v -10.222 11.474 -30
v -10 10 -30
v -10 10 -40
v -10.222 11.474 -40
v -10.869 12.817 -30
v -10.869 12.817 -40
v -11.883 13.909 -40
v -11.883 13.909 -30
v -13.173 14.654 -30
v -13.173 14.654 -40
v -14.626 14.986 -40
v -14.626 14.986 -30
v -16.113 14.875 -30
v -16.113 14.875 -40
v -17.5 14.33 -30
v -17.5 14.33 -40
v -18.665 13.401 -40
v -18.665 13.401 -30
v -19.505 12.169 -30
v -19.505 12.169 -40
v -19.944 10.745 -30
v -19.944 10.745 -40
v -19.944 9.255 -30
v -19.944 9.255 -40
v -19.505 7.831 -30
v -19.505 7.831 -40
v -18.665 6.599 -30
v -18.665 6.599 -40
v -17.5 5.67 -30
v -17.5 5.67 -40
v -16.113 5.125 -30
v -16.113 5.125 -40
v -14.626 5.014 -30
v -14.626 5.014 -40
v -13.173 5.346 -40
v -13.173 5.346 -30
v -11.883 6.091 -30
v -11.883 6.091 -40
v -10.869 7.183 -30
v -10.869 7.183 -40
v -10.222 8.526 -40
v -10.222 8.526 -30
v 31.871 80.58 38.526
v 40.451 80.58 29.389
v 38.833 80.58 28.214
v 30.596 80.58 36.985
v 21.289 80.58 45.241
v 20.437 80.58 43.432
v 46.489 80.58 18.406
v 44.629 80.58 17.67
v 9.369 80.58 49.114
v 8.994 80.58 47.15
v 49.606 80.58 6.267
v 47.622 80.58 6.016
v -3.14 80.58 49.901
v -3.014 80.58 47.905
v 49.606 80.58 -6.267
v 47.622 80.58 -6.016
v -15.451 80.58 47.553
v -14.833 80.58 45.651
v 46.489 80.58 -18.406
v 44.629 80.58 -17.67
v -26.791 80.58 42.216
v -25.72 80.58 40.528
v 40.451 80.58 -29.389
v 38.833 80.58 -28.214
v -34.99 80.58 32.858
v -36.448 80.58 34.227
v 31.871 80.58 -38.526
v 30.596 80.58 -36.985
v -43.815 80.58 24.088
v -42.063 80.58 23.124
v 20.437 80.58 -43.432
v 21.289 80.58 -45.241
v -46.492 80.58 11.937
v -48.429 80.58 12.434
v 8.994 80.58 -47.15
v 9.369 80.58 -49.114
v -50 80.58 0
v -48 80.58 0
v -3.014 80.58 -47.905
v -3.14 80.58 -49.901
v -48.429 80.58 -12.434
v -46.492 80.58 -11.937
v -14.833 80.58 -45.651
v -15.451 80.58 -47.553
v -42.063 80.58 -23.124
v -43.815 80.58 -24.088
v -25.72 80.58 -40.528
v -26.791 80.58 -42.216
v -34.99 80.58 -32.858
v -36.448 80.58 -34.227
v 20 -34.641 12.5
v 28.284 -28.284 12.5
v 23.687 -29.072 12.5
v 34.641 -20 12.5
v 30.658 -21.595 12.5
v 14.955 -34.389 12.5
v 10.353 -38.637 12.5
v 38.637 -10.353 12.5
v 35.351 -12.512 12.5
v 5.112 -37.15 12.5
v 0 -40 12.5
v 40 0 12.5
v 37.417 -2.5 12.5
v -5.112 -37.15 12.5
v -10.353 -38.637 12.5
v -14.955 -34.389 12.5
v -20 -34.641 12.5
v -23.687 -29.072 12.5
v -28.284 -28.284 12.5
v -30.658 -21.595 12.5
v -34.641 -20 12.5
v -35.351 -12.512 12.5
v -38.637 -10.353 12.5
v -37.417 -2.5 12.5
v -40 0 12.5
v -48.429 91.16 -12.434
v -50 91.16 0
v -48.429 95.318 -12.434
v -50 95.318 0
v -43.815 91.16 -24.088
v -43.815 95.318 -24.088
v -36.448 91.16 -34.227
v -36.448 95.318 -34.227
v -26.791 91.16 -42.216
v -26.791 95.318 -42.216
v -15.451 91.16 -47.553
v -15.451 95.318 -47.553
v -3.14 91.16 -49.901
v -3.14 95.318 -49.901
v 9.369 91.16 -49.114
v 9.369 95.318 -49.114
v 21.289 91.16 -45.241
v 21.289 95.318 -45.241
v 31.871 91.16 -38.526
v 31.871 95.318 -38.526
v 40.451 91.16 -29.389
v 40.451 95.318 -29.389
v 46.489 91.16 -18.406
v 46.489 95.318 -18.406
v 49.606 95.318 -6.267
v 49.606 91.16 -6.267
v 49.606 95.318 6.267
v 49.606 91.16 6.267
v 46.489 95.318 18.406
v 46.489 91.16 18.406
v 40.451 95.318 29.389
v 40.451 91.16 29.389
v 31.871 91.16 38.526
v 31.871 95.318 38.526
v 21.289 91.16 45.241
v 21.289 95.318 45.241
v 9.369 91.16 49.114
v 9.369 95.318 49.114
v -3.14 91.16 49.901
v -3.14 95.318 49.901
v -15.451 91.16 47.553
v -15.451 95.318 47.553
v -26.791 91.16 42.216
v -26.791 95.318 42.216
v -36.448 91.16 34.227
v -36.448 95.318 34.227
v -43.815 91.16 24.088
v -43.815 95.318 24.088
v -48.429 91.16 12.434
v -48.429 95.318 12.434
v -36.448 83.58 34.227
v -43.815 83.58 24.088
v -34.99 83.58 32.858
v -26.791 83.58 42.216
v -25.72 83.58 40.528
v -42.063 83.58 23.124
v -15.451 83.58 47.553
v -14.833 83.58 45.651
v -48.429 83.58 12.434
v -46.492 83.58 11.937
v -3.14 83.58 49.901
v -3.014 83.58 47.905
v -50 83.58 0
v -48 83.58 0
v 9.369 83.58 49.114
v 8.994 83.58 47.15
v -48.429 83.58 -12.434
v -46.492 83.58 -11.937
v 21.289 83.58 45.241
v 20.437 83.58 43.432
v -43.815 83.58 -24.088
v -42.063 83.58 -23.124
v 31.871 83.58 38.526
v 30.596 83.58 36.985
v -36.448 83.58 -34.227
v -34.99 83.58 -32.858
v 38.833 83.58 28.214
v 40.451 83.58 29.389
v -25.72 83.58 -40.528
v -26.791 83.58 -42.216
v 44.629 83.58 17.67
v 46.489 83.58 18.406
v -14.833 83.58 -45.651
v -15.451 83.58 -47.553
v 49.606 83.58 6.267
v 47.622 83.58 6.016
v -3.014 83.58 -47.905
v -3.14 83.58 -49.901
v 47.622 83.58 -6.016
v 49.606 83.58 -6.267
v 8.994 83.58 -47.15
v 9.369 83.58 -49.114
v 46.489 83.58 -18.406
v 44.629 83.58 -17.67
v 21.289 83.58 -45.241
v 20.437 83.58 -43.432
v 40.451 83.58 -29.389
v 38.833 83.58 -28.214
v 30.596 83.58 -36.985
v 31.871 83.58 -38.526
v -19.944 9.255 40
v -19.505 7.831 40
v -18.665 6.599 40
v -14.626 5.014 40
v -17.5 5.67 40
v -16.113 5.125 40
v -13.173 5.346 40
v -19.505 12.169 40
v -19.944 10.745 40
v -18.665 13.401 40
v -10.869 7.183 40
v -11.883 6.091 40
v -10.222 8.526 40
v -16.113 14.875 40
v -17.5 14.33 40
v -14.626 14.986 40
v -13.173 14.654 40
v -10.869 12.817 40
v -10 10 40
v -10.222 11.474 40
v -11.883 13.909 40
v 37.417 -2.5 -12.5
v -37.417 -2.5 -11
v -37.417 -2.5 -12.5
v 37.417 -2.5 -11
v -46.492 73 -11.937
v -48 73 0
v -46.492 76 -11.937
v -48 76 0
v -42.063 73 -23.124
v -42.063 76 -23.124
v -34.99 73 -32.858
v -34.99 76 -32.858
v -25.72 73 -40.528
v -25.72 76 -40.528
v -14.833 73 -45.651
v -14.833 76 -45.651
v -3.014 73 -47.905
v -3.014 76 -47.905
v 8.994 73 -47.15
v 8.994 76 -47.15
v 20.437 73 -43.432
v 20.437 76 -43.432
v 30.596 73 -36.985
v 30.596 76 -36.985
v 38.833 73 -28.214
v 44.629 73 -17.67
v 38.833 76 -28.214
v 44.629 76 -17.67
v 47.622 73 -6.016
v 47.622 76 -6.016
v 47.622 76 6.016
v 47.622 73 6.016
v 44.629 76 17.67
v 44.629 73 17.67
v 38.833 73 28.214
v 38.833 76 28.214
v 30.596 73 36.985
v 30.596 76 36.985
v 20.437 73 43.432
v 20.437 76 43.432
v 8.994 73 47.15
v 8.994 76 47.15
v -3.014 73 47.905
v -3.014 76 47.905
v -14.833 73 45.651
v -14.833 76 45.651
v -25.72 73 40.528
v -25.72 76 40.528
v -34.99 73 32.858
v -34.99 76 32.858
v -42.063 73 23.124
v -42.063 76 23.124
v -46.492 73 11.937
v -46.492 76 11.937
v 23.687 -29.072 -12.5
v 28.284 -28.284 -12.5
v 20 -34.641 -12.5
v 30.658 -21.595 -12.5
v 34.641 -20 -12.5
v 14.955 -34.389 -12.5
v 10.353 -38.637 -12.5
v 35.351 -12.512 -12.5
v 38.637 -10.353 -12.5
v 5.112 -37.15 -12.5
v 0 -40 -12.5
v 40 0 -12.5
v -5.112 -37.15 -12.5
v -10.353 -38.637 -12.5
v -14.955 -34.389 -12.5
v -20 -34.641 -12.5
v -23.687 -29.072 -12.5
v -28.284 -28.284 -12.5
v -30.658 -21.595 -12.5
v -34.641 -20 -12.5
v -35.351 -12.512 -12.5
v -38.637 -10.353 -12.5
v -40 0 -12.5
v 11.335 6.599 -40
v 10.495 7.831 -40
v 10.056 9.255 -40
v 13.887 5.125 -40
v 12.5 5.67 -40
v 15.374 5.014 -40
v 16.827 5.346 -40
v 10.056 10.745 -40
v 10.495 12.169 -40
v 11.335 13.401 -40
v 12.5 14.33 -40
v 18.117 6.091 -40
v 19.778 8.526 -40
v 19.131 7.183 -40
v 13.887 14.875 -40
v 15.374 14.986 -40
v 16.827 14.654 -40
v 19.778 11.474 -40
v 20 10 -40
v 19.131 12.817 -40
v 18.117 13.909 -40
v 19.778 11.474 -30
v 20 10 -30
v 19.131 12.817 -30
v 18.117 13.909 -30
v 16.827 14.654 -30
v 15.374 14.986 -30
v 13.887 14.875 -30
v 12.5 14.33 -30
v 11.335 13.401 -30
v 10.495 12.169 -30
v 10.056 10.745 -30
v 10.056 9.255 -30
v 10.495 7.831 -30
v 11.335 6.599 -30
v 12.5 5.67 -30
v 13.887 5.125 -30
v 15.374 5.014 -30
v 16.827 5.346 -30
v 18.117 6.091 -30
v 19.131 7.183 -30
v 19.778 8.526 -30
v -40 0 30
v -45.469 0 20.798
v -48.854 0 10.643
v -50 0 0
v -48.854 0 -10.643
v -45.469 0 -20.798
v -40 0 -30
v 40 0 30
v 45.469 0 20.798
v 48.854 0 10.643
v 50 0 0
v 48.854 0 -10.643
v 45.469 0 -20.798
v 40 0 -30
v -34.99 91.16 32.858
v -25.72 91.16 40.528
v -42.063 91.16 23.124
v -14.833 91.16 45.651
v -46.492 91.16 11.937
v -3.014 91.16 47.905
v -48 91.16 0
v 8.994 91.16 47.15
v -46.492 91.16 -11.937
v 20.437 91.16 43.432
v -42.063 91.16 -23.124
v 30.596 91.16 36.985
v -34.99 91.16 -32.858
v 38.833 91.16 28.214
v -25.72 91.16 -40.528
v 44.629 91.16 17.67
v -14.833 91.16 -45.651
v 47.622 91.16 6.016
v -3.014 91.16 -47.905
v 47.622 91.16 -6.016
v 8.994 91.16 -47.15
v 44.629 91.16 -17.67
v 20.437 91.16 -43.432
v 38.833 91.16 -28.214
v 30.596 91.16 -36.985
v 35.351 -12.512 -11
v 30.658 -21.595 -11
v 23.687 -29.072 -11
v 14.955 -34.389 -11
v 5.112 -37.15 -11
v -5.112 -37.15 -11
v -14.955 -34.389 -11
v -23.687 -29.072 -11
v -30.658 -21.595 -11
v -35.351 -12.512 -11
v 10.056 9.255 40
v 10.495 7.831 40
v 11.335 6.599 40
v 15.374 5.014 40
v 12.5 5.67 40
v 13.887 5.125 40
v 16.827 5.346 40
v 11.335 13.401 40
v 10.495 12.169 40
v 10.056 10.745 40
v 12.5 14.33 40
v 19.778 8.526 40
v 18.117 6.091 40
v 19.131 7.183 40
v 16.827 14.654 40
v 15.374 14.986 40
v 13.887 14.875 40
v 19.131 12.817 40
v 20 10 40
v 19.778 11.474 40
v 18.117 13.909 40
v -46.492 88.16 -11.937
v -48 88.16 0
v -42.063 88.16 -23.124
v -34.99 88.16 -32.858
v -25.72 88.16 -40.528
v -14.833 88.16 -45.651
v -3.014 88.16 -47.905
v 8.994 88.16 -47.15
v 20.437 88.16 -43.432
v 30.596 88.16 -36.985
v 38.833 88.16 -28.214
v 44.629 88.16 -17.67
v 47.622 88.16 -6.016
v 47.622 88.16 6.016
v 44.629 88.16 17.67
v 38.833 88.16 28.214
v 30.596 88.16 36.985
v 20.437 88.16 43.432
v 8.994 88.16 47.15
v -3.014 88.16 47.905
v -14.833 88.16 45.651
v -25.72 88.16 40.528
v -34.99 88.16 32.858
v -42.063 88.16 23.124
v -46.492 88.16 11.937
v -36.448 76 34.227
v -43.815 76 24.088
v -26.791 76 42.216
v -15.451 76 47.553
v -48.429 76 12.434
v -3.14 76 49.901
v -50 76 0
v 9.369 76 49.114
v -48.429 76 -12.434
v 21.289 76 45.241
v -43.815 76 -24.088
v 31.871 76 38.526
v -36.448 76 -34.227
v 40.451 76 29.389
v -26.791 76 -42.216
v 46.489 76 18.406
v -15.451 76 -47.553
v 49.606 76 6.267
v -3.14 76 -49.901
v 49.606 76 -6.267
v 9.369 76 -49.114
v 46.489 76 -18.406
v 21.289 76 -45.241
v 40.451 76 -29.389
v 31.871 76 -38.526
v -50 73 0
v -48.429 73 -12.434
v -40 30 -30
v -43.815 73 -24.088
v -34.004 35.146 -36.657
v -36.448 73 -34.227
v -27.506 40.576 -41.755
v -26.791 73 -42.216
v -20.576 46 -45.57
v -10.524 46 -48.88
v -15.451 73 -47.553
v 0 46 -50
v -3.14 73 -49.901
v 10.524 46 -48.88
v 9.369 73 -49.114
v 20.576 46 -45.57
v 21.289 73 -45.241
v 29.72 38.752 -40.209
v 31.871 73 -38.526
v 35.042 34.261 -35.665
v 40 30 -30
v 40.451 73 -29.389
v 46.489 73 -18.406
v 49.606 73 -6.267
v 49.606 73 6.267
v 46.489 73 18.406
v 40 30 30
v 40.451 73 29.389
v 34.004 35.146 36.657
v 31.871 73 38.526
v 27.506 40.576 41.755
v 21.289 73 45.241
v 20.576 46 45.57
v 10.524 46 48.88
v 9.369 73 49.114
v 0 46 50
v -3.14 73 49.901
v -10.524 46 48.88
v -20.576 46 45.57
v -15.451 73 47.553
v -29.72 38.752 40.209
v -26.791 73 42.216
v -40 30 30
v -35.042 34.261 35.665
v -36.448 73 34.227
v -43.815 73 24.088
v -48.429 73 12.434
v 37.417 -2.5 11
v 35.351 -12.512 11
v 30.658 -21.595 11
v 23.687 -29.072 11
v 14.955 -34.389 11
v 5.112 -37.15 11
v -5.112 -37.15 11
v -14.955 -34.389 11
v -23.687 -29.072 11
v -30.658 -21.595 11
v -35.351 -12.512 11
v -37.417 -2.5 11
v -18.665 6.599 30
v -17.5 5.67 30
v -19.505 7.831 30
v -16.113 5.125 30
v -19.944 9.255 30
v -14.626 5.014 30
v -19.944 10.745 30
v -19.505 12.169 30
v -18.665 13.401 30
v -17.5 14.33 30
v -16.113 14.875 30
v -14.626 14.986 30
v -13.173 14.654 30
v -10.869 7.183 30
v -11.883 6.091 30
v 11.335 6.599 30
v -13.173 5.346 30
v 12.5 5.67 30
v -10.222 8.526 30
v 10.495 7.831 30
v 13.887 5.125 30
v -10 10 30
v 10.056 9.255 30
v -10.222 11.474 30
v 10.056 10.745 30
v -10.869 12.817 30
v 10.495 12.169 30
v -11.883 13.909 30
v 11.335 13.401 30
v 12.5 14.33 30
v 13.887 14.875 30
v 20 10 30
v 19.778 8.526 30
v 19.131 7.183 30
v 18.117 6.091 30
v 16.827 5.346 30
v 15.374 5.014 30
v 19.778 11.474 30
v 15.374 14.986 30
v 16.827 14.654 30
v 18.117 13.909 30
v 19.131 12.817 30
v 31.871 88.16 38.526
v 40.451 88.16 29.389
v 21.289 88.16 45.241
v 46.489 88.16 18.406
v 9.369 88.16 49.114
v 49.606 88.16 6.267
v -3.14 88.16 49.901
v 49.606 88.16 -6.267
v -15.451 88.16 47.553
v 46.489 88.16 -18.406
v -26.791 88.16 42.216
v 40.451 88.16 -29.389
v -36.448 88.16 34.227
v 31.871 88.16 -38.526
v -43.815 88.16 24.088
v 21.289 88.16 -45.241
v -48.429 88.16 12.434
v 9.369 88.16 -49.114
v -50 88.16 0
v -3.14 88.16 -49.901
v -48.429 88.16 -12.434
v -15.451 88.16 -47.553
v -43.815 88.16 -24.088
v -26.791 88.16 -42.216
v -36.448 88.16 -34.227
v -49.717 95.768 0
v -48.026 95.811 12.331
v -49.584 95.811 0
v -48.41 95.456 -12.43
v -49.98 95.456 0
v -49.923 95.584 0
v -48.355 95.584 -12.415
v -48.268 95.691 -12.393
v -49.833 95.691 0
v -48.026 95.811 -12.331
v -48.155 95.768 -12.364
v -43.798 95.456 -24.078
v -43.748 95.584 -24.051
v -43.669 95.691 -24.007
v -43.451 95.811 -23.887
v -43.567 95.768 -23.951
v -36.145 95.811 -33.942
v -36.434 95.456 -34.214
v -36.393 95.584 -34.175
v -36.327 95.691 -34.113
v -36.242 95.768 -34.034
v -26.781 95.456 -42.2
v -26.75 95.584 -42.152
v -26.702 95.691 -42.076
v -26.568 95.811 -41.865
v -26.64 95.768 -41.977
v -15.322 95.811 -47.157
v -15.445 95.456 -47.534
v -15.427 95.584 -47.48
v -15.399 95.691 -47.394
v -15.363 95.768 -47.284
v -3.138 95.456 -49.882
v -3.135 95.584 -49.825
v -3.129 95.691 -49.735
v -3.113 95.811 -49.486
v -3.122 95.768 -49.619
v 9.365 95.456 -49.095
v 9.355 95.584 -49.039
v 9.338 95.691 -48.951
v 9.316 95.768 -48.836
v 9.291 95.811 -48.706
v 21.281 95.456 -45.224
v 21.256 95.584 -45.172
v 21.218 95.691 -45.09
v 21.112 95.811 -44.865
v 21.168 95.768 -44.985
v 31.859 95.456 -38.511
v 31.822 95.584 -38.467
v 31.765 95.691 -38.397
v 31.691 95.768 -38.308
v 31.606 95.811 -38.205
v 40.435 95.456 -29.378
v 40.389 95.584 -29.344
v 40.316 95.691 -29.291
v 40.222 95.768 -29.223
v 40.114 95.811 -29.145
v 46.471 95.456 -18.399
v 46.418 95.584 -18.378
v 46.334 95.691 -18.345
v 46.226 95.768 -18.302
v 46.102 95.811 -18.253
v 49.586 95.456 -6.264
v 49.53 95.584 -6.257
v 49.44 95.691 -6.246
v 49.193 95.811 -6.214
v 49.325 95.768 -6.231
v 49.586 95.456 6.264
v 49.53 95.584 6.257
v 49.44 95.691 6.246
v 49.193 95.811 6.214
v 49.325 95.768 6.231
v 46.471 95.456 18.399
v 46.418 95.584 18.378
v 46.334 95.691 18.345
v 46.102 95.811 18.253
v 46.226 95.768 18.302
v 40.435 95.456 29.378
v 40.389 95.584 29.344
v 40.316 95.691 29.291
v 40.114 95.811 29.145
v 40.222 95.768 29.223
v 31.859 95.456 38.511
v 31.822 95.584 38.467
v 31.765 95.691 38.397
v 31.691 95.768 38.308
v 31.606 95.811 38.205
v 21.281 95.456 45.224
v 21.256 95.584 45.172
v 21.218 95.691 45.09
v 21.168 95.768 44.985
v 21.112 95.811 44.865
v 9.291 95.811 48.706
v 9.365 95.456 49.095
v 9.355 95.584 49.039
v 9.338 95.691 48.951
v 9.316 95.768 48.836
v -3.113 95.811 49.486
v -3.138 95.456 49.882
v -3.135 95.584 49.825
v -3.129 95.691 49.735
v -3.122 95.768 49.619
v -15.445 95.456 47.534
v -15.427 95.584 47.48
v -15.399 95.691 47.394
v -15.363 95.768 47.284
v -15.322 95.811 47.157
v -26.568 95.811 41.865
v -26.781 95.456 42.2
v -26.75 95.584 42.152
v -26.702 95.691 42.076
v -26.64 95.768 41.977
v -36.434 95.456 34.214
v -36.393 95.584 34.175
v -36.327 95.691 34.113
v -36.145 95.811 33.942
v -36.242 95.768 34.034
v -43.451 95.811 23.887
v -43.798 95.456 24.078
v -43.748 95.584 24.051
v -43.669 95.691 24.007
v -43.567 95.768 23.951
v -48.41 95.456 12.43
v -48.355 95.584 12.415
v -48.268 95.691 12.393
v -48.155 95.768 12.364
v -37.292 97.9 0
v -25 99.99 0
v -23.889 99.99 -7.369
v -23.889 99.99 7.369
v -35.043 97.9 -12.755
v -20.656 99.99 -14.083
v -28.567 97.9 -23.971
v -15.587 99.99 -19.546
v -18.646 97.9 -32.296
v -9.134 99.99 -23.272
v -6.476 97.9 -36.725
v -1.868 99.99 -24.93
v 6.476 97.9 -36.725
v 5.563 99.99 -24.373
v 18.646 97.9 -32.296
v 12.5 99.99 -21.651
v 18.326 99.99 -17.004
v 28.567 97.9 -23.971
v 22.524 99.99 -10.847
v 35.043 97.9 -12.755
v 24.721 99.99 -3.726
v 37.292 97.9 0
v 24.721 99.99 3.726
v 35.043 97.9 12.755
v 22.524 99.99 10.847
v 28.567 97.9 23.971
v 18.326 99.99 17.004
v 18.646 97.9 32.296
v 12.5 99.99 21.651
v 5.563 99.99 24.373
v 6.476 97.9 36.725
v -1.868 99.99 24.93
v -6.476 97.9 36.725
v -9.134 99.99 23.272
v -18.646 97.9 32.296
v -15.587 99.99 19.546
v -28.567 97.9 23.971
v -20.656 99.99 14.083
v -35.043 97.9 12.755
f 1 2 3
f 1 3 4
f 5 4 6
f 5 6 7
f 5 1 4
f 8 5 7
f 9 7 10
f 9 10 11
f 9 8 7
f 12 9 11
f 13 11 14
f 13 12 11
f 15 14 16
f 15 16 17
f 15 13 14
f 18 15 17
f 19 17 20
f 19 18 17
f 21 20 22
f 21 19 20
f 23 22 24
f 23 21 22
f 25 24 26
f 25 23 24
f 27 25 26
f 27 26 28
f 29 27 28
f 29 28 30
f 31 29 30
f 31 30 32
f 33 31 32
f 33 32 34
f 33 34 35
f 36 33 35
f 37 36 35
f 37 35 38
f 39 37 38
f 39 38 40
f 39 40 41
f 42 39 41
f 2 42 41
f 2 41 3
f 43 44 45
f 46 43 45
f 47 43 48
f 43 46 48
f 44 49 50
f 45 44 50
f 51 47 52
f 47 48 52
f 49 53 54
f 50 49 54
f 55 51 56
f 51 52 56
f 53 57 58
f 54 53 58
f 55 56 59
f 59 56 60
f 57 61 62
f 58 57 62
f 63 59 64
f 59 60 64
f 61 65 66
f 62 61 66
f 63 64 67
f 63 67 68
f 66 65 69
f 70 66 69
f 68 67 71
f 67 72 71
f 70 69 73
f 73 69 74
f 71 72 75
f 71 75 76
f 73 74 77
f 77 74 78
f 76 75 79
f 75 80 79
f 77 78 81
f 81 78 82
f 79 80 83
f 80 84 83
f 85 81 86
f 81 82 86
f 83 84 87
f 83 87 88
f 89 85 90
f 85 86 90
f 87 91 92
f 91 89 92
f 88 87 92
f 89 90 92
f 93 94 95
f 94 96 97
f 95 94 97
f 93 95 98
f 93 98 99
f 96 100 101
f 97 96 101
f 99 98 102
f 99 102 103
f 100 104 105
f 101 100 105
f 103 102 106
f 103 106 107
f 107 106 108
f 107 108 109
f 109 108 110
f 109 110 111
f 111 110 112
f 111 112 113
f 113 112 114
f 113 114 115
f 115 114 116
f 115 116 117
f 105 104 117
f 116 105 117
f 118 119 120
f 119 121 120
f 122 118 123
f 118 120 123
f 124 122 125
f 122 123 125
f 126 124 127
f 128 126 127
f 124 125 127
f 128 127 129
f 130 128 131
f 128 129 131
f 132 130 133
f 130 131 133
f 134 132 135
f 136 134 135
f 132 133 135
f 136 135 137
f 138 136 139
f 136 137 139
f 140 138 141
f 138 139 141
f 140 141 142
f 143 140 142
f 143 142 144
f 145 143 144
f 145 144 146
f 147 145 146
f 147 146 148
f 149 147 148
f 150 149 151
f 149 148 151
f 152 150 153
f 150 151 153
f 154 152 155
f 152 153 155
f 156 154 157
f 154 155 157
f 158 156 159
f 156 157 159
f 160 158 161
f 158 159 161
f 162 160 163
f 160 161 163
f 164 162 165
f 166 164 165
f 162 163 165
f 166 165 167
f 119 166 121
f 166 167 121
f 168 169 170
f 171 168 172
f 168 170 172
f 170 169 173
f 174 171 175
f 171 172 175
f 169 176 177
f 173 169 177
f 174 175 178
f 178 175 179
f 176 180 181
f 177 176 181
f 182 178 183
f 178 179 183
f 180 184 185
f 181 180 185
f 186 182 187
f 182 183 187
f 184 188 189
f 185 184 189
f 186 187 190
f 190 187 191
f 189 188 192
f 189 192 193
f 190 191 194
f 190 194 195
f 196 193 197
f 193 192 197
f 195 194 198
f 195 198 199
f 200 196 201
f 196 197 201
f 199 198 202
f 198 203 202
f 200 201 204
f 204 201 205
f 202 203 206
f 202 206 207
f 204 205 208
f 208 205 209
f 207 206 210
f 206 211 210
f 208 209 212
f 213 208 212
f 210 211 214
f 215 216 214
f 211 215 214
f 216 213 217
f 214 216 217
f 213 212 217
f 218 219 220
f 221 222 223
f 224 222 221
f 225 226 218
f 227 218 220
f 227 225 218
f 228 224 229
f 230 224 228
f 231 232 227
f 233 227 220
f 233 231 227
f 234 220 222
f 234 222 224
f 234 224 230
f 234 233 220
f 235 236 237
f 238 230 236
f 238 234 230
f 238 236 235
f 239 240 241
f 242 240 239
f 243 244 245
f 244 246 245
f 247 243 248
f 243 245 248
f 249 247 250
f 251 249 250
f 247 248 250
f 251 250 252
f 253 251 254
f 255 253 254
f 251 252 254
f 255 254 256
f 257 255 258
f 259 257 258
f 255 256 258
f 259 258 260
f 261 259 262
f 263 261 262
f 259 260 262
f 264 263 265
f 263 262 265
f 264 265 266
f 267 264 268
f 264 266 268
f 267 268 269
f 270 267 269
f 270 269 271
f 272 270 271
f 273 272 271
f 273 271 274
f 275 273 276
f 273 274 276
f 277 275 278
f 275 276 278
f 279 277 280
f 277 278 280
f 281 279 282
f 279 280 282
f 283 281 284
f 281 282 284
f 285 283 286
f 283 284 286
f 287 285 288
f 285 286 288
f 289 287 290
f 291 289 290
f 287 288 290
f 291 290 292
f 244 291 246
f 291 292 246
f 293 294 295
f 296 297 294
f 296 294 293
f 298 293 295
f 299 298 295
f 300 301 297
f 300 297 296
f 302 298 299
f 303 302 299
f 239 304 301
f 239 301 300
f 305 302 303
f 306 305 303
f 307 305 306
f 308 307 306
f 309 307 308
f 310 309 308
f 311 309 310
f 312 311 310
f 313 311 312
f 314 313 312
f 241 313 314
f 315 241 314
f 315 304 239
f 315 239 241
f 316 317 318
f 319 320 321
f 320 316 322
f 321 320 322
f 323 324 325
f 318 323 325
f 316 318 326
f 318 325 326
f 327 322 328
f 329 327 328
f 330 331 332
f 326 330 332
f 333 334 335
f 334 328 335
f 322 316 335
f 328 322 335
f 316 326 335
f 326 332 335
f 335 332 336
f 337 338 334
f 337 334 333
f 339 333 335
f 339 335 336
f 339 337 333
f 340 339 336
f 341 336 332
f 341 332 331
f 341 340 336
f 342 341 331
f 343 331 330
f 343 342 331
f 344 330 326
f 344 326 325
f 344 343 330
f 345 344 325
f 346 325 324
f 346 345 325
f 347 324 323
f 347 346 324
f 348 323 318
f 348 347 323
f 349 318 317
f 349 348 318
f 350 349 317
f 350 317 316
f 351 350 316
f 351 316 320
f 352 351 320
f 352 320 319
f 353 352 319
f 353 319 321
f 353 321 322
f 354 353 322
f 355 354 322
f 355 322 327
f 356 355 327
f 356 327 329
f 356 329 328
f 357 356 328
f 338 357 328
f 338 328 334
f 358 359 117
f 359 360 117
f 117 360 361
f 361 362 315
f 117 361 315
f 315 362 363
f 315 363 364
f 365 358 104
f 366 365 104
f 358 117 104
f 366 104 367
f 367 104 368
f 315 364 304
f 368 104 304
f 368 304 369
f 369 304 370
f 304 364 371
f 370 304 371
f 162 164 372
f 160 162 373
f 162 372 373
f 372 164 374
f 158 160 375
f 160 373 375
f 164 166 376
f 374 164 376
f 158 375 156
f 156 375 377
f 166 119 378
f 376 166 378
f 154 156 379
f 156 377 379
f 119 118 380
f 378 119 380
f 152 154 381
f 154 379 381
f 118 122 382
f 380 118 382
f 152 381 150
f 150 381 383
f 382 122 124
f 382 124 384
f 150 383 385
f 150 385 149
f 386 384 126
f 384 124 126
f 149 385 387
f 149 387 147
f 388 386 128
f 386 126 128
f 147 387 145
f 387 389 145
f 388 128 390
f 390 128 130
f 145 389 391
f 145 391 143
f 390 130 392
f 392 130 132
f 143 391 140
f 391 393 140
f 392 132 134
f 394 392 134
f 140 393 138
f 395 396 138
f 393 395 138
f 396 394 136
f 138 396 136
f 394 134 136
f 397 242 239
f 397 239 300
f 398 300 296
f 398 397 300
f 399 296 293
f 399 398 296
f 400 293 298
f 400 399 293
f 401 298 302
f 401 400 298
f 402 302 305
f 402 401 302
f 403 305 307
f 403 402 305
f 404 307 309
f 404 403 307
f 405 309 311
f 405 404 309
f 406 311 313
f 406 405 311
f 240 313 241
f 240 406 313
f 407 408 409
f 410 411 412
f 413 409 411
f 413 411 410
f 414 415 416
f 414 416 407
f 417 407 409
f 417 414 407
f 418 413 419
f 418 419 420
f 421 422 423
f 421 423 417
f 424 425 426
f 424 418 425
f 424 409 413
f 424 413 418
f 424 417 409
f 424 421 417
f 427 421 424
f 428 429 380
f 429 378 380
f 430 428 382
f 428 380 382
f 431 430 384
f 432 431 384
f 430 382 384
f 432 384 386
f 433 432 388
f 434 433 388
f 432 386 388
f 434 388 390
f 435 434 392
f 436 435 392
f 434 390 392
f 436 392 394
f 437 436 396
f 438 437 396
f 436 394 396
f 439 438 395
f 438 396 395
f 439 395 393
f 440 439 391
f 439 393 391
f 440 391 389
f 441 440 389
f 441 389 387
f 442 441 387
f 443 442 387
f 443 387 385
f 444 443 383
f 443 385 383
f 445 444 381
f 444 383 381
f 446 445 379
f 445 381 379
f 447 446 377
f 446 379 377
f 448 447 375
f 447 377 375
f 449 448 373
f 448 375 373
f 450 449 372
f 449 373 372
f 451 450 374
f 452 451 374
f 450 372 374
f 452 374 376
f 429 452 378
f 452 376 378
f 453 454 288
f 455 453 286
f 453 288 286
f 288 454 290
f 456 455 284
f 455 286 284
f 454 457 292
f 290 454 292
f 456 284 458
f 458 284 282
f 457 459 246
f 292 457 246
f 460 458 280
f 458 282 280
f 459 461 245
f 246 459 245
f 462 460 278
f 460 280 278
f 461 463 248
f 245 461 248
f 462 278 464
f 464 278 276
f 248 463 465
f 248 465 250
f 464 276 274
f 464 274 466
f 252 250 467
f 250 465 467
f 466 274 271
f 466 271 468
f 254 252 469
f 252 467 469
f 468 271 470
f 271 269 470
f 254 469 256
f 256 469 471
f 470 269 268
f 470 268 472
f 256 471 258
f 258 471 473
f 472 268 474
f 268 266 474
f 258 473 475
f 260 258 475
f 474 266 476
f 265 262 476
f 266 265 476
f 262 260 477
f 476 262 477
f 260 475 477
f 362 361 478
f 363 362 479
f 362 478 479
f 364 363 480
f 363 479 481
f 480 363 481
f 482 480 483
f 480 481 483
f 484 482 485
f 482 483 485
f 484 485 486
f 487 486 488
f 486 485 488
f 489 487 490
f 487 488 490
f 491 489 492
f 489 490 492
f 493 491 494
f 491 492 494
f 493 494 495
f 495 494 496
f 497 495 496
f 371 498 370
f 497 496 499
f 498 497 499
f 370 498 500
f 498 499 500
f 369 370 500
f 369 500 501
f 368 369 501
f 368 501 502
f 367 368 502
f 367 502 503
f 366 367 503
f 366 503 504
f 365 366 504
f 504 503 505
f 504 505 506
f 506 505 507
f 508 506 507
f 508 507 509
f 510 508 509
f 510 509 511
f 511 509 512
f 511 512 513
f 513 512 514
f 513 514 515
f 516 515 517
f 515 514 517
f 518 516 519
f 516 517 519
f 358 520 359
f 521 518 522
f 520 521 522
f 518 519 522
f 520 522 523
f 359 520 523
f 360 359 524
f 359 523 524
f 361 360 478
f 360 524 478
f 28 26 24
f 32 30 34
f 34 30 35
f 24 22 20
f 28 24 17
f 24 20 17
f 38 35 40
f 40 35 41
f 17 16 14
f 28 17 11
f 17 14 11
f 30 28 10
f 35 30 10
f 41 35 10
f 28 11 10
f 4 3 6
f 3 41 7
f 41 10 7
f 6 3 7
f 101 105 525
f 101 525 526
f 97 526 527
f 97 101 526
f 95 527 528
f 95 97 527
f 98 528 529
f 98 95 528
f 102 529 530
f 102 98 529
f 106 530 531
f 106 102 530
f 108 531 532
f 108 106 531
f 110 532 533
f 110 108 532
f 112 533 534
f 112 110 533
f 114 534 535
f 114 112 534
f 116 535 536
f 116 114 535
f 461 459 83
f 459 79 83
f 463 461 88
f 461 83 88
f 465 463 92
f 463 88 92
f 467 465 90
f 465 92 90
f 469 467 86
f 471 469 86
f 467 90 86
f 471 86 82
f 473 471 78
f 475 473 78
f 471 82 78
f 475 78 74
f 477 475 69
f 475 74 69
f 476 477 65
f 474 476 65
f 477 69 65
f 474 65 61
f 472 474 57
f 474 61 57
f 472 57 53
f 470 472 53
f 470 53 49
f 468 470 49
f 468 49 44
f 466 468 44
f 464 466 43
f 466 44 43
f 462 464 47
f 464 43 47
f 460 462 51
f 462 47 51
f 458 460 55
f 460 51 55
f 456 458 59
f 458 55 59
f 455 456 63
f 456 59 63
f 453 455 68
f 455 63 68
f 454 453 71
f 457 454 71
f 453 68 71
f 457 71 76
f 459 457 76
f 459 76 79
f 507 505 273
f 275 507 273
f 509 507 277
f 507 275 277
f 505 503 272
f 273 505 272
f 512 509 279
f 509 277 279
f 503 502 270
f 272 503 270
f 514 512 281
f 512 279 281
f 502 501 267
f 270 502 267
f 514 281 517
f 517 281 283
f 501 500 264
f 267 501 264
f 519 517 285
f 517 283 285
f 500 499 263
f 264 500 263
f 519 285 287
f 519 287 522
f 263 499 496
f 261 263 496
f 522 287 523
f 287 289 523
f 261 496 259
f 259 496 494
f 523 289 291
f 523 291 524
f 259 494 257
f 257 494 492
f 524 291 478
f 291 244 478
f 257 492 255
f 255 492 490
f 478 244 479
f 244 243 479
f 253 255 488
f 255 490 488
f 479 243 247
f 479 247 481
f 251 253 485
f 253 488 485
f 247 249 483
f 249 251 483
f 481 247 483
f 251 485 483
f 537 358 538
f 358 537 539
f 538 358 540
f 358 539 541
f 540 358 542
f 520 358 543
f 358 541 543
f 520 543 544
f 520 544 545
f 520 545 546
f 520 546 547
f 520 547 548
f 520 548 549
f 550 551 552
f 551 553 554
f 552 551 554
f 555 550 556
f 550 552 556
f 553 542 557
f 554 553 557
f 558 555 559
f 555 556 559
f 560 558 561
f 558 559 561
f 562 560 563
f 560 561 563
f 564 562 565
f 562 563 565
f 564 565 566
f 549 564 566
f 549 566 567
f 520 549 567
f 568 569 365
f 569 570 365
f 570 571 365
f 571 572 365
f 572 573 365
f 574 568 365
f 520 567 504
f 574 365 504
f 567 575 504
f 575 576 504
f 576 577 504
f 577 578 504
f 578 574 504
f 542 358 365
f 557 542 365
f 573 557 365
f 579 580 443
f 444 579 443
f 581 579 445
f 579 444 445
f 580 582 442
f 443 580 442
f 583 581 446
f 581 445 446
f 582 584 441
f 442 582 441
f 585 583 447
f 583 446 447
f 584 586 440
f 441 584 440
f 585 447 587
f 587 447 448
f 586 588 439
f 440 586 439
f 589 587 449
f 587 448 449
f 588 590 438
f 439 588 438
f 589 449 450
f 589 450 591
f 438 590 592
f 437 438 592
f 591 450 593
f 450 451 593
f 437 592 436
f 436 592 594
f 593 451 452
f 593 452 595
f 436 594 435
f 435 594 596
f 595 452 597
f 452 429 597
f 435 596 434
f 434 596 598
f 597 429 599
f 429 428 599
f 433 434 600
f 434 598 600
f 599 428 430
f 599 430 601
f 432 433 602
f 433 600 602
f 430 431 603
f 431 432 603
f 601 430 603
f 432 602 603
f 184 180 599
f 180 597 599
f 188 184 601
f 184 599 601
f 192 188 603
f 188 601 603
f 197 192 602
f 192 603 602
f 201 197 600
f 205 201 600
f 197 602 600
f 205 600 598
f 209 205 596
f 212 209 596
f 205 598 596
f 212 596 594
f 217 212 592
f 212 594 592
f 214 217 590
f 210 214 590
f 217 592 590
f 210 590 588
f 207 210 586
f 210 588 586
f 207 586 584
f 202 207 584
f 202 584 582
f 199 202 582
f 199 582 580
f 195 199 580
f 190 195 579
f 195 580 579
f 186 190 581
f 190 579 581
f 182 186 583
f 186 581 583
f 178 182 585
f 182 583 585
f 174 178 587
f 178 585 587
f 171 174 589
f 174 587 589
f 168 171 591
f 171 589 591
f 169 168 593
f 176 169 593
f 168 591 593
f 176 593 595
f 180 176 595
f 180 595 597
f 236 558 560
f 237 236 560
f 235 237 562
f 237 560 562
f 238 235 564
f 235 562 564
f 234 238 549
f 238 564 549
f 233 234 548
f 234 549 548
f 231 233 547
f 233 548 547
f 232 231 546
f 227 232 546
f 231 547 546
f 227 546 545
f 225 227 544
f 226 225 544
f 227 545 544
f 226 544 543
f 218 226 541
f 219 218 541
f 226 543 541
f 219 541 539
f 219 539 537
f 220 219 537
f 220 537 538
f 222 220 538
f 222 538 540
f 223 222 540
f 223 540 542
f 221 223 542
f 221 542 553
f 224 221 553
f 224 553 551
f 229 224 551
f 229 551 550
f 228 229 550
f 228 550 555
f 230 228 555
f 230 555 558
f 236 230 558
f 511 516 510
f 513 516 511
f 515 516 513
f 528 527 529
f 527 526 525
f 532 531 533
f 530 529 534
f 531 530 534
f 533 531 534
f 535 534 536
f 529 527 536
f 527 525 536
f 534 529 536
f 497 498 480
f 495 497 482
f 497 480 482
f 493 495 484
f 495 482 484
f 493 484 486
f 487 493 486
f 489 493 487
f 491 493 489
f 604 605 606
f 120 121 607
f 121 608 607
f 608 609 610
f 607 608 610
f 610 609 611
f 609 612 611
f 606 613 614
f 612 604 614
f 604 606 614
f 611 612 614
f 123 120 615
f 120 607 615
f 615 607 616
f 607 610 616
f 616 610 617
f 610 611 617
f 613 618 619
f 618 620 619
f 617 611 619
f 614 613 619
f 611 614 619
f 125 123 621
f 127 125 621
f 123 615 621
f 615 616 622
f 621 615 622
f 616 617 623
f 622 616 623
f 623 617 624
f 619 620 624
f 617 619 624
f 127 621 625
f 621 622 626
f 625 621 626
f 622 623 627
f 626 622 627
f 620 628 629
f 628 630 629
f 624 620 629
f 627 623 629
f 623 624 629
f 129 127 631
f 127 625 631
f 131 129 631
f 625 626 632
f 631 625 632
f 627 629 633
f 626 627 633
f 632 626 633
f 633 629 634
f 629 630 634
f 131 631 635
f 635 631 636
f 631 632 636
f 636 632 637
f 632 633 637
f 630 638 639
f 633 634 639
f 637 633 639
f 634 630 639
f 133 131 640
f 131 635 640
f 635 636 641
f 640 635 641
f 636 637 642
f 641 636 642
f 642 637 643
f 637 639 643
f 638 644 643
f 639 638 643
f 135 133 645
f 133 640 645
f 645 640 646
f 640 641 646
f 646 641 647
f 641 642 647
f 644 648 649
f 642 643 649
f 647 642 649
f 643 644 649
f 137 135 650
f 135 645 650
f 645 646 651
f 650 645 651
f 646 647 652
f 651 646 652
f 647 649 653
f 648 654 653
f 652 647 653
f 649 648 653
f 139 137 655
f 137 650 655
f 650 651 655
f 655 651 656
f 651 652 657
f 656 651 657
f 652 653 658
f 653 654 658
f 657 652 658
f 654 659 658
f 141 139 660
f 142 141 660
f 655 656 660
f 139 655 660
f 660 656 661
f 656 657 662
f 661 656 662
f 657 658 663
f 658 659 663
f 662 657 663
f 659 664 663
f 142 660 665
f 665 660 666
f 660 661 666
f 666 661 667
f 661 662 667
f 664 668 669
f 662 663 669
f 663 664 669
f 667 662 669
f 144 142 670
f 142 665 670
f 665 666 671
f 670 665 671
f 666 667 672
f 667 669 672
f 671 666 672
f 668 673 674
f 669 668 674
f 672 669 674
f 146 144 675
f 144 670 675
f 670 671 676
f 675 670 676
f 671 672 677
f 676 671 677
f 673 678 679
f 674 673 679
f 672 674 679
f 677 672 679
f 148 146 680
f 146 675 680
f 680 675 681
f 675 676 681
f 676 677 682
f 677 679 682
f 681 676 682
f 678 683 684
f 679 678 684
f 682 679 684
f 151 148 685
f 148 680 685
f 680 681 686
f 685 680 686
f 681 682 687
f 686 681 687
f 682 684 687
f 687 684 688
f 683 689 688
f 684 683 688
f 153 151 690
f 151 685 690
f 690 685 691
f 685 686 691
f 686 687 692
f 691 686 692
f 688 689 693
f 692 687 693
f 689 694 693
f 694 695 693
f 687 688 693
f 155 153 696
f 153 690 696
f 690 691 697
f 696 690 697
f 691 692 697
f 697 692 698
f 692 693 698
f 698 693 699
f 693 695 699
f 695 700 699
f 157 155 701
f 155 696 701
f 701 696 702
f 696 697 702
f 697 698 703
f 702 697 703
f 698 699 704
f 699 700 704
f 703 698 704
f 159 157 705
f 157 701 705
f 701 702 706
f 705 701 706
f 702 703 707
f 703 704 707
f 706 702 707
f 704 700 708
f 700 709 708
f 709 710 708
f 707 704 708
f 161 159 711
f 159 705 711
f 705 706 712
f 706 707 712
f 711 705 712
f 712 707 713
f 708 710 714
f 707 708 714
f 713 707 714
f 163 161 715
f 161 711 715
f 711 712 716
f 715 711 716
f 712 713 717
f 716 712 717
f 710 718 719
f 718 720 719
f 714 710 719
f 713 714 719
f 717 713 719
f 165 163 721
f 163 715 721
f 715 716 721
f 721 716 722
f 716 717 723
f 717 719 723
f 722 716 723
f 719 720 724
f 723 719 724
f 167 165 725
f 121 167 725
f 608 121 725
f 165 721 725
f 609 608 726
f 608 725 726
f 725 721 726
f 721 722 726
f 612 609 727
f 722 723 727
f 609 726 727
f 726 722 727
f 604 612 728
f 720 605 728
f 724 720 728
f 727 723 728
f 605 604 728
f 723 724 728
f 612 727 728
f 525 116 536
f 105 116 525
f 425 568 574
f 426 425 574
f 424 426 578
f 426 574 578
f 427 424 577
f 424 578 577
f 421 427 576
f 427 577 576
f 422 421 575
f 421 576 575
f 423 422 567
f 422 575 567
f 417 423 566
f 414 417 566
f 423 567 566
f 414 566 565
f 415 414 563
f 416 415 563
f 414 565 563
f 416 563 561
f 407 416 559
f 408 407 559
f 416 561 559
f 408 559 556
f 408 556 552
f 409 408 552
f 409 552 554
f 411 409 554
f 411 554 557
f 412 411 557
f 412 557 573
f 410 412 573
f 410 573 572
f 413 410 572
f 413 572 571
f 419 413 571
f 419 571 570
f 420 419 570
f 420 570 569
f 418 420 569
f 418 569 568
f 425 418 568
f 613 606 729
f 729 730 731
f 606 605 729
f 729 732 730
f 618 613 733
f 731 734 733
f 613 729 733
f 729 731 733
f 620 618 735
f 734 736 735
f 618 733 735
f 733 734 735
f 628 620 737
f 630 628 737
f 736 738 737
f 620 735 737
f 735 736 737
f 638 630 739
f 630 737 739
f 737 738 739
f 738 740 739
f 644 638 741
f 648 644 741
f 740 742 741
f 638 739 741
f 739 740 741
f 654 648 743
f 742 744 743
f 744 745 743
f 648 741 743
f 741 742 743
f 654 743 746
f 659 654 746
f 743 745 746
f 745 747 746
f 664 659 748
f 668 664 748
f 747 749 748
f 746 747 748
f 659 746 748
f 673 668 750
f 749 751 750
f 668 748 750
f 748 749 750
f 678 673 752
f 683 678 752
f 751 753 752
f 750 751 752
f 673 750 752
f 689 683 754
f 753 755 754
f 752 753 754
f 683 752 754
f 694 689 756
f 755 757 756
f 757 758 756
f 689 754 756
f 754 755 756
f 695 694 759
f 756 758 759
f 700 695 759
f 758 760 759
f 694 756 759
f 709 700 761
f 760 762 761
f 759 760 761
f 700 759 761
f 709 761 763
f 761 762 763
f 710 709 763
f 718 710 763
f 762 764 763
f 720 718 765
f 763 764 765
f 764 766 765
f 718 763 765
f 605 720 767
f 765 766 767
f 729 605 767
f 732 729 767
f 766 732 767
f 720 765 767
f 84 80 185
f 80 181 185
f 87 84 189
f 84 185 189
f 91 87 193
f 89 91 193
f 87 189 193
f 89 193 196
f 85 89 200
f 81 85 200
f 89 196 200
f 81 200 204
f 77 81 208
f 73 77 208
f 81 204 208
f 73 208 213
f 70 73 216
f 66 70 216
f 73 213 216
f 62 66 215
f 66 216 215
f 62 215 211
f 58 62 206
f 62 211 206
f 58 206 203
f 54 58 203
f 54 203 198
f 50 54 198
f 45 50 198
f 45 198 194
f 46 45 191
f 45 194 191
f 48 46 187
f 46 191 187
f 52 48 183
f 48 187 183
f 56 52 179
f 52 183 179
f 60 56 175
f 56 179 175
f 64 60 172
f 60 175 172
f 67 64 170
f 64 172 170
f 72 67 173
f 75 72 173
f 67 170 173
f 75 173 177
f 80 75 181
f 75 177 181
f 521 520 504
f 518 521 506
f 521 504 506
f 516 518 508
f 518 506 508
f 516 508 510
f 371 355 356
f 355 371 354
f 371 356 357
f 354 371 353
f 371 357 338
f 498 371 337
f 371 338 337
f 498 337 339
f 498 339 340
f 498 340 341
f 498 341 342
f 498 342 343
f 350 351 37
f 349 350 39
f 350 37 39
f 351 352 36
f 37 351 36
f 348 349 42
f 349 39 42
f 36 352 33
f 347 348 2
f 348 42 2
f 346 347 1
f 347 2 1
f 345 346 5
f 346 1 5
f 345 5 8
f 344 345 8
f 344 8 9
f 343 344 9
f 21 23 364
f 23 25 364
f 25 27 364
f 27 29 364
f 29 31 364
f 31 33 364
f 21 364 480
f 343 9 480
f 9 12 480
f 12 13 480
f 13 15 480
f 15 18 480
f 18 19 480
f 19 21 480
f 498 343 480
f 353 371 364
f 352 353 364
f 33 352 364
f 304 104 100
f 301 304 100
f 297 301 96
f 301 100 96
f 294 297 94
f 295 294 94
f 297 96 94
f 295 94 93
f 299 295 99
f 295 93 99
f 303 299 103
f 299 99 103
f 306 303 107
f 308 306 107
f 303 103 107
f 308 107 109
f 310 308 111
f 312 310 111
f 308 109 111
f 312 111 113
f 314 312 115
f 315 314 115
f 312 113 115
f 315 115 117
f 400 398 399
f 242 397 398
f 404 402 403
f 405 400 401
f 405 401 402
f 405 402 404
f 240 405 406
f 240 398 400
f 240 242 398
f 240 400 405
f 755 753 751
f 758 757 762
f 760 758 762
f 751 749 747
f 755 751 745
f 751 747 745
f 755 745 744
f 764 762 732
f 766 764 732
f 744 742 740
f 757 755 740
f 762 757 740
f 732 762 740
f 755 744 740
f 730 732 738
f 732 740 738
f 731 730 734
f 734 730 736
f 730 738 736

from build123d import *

# Parameters (mm, degrees)
CUT_EXTRUDE2_DEPTH       = 51
CUT_EXTRUDE2_DEPTH_BACK  = 51
BOSS_EXTRUDE3_DEPTH      = 12.5
BOSS_EXTRUDE3_DEPTH_BACK = 12.5
BOSS_EXTRUDE4_DEPTH      = 11
BOSS_EXTRUDE4_DEPTH_BACK = 11
SKETCH4_8_R              = 5
BOSS_EXTRUDE5_DEPTH      = 40
BOSS_EXTRUDE5_DEPTH_BACK = 40


with BuildPart() as part:
    # Sketch1 → Revolve2 (revolve)
    with BuildSketch(Plane.XY):
        with BuildLine():
            ThreePointArc((-50, 95.31782646), (-49.882033293, 95.640395155), (-49.583797747, 95.810754383))
            Line((-49.583797747, 95.810754383), (-25, 99.99))
            Line((-25, 99.99), (0, 99.99))
            Line((0, 99.99), (0, 95.74))
            Line((0, 95.74), (0, 0))
            Line((0, 0), (-50, 0))
            Line((-50, 0), (-50, 73))
            Line((-50, 73), (-48, 73))
            Line((-48, 73), (-48, 76))
            Line((-48, 76), (-50, 76))
            Line((-50, 76), (-50, 80.58))
            Line((-50, 80.58), (-48, 80.58))
            Line((-48, 80.58), (-48, 83.58))
            Line((-48, 83.58), (-50, 83.58))
            Line((-50, 83.58), (-50, 88.16))
            Line((-50, 88.16), (-48, 88.16))
            Line((-48, 88.16), (-48, 91.16))
            Line((-48, 91.16), (-50, 91.16))
            Line((-50, 91.16), (-50, 95.31782646))
        make_face()
    revolve(axis=Axis((0, 95.74, 0), (0, -1, 0)))

    # Sketch2 → Cut-Extrude2 (cut, two sides)
    with BuildSketch(Plane(origin=(0, 0, 0), x_dir=(0, 0, -1), z_dir=(1, 0, 0))) as cut_extrude2_sk:
        with BuildLine():
            Line((30, 0), (30, 30))
            ThreePointArc((30, 30), (38.689431083, 37.119875503), (45.57, 46))
            Line((45.57, 46), (50, 46))
            Line((50, 46), (50, 0))
            Line((50, 0), (30, 0))
        make_face()
        with BuildLine():
            Line((-30, 0), (-30, 30))
            ThreePointArc((-30, 30), (-38.689431083, 37.119875503), (-45.57, 46))
            Line((-45.57, 46), (-50, 46))
            Line((-50, 46), (-50, 0))
            Line((-50, 0), (-30, 0))
        make_face()
    extrude(amount=CUT_EXTRUDE2_DEPTH, mode=Mode.SUBTRACT)
    extrude(cut_extrude2_sk.sketch, amount=-CUT_EXTRUDE2_DEPTH_BACK, mode=Mode.SUBTRACT)

    # Sketch4 → Boss-Extrude3 (add, two sides)
    with BuildSketch(Plane.XY) as boss_extrude3_sk:
        with BuildLine():
            Line((-40, 0), (40, 0))
            ThreePointArc((40, 0), (0, -40), (-40, 0))
        make_face()
        with BuildLine():
            Line((-37.416573868, -2.5), (37.416573868, -2.5))
            ThreePointArc((37.416573868, -2.5), (0, -37.5), (-37.416573868, -2.5))
        make_face(mode=Mode.SUBTRACT)
    extrude(amount=BOSS_EXTRUDE3_DEPTH)
    extrude(boss_extrude3_sk.sketch, amount=-BOSS_EXTRUDE3_DEPTH_BACK)

    # Sketch4<7> → Boss-Extrude4 (add, two sides)
    with BuildSketch(Plane.XY) as boss_extrude4_sk:
        with BuildLine():
            Line((-37.416573868, -2.5), (37.416573868, -2.5))
            ThreePointArc((37.416573868, -2.5), (0, -37.5), (-37.416573868, -2.5))
        make_face()
    extrude(amount=BOSS_EXTRUDE4_DEPTH)
    extrude(boss_extrude4_sk.sketch, amount=-BOSS_EXTRUDE4_DEPTH_BACK)

    # Sketch4<8> → Boss-Extrude5 (add, two sides)
    with BuildSketch(Plane.XY) as boss_extrude5_sk:
        with Locations((-15, 10)):
            Circle(SKETCH4_8_R)
        with Locations((15, 10)):
            Circle(SKETCH4_8_R)
    extrude(amount=BOSS_EXTRUDE5_DEPTH)
    extrude(boss_extrude5_sk.sketch, amount=-BOSS_EXTRUDE5_DEPTH_BACK)


solid = part.part
